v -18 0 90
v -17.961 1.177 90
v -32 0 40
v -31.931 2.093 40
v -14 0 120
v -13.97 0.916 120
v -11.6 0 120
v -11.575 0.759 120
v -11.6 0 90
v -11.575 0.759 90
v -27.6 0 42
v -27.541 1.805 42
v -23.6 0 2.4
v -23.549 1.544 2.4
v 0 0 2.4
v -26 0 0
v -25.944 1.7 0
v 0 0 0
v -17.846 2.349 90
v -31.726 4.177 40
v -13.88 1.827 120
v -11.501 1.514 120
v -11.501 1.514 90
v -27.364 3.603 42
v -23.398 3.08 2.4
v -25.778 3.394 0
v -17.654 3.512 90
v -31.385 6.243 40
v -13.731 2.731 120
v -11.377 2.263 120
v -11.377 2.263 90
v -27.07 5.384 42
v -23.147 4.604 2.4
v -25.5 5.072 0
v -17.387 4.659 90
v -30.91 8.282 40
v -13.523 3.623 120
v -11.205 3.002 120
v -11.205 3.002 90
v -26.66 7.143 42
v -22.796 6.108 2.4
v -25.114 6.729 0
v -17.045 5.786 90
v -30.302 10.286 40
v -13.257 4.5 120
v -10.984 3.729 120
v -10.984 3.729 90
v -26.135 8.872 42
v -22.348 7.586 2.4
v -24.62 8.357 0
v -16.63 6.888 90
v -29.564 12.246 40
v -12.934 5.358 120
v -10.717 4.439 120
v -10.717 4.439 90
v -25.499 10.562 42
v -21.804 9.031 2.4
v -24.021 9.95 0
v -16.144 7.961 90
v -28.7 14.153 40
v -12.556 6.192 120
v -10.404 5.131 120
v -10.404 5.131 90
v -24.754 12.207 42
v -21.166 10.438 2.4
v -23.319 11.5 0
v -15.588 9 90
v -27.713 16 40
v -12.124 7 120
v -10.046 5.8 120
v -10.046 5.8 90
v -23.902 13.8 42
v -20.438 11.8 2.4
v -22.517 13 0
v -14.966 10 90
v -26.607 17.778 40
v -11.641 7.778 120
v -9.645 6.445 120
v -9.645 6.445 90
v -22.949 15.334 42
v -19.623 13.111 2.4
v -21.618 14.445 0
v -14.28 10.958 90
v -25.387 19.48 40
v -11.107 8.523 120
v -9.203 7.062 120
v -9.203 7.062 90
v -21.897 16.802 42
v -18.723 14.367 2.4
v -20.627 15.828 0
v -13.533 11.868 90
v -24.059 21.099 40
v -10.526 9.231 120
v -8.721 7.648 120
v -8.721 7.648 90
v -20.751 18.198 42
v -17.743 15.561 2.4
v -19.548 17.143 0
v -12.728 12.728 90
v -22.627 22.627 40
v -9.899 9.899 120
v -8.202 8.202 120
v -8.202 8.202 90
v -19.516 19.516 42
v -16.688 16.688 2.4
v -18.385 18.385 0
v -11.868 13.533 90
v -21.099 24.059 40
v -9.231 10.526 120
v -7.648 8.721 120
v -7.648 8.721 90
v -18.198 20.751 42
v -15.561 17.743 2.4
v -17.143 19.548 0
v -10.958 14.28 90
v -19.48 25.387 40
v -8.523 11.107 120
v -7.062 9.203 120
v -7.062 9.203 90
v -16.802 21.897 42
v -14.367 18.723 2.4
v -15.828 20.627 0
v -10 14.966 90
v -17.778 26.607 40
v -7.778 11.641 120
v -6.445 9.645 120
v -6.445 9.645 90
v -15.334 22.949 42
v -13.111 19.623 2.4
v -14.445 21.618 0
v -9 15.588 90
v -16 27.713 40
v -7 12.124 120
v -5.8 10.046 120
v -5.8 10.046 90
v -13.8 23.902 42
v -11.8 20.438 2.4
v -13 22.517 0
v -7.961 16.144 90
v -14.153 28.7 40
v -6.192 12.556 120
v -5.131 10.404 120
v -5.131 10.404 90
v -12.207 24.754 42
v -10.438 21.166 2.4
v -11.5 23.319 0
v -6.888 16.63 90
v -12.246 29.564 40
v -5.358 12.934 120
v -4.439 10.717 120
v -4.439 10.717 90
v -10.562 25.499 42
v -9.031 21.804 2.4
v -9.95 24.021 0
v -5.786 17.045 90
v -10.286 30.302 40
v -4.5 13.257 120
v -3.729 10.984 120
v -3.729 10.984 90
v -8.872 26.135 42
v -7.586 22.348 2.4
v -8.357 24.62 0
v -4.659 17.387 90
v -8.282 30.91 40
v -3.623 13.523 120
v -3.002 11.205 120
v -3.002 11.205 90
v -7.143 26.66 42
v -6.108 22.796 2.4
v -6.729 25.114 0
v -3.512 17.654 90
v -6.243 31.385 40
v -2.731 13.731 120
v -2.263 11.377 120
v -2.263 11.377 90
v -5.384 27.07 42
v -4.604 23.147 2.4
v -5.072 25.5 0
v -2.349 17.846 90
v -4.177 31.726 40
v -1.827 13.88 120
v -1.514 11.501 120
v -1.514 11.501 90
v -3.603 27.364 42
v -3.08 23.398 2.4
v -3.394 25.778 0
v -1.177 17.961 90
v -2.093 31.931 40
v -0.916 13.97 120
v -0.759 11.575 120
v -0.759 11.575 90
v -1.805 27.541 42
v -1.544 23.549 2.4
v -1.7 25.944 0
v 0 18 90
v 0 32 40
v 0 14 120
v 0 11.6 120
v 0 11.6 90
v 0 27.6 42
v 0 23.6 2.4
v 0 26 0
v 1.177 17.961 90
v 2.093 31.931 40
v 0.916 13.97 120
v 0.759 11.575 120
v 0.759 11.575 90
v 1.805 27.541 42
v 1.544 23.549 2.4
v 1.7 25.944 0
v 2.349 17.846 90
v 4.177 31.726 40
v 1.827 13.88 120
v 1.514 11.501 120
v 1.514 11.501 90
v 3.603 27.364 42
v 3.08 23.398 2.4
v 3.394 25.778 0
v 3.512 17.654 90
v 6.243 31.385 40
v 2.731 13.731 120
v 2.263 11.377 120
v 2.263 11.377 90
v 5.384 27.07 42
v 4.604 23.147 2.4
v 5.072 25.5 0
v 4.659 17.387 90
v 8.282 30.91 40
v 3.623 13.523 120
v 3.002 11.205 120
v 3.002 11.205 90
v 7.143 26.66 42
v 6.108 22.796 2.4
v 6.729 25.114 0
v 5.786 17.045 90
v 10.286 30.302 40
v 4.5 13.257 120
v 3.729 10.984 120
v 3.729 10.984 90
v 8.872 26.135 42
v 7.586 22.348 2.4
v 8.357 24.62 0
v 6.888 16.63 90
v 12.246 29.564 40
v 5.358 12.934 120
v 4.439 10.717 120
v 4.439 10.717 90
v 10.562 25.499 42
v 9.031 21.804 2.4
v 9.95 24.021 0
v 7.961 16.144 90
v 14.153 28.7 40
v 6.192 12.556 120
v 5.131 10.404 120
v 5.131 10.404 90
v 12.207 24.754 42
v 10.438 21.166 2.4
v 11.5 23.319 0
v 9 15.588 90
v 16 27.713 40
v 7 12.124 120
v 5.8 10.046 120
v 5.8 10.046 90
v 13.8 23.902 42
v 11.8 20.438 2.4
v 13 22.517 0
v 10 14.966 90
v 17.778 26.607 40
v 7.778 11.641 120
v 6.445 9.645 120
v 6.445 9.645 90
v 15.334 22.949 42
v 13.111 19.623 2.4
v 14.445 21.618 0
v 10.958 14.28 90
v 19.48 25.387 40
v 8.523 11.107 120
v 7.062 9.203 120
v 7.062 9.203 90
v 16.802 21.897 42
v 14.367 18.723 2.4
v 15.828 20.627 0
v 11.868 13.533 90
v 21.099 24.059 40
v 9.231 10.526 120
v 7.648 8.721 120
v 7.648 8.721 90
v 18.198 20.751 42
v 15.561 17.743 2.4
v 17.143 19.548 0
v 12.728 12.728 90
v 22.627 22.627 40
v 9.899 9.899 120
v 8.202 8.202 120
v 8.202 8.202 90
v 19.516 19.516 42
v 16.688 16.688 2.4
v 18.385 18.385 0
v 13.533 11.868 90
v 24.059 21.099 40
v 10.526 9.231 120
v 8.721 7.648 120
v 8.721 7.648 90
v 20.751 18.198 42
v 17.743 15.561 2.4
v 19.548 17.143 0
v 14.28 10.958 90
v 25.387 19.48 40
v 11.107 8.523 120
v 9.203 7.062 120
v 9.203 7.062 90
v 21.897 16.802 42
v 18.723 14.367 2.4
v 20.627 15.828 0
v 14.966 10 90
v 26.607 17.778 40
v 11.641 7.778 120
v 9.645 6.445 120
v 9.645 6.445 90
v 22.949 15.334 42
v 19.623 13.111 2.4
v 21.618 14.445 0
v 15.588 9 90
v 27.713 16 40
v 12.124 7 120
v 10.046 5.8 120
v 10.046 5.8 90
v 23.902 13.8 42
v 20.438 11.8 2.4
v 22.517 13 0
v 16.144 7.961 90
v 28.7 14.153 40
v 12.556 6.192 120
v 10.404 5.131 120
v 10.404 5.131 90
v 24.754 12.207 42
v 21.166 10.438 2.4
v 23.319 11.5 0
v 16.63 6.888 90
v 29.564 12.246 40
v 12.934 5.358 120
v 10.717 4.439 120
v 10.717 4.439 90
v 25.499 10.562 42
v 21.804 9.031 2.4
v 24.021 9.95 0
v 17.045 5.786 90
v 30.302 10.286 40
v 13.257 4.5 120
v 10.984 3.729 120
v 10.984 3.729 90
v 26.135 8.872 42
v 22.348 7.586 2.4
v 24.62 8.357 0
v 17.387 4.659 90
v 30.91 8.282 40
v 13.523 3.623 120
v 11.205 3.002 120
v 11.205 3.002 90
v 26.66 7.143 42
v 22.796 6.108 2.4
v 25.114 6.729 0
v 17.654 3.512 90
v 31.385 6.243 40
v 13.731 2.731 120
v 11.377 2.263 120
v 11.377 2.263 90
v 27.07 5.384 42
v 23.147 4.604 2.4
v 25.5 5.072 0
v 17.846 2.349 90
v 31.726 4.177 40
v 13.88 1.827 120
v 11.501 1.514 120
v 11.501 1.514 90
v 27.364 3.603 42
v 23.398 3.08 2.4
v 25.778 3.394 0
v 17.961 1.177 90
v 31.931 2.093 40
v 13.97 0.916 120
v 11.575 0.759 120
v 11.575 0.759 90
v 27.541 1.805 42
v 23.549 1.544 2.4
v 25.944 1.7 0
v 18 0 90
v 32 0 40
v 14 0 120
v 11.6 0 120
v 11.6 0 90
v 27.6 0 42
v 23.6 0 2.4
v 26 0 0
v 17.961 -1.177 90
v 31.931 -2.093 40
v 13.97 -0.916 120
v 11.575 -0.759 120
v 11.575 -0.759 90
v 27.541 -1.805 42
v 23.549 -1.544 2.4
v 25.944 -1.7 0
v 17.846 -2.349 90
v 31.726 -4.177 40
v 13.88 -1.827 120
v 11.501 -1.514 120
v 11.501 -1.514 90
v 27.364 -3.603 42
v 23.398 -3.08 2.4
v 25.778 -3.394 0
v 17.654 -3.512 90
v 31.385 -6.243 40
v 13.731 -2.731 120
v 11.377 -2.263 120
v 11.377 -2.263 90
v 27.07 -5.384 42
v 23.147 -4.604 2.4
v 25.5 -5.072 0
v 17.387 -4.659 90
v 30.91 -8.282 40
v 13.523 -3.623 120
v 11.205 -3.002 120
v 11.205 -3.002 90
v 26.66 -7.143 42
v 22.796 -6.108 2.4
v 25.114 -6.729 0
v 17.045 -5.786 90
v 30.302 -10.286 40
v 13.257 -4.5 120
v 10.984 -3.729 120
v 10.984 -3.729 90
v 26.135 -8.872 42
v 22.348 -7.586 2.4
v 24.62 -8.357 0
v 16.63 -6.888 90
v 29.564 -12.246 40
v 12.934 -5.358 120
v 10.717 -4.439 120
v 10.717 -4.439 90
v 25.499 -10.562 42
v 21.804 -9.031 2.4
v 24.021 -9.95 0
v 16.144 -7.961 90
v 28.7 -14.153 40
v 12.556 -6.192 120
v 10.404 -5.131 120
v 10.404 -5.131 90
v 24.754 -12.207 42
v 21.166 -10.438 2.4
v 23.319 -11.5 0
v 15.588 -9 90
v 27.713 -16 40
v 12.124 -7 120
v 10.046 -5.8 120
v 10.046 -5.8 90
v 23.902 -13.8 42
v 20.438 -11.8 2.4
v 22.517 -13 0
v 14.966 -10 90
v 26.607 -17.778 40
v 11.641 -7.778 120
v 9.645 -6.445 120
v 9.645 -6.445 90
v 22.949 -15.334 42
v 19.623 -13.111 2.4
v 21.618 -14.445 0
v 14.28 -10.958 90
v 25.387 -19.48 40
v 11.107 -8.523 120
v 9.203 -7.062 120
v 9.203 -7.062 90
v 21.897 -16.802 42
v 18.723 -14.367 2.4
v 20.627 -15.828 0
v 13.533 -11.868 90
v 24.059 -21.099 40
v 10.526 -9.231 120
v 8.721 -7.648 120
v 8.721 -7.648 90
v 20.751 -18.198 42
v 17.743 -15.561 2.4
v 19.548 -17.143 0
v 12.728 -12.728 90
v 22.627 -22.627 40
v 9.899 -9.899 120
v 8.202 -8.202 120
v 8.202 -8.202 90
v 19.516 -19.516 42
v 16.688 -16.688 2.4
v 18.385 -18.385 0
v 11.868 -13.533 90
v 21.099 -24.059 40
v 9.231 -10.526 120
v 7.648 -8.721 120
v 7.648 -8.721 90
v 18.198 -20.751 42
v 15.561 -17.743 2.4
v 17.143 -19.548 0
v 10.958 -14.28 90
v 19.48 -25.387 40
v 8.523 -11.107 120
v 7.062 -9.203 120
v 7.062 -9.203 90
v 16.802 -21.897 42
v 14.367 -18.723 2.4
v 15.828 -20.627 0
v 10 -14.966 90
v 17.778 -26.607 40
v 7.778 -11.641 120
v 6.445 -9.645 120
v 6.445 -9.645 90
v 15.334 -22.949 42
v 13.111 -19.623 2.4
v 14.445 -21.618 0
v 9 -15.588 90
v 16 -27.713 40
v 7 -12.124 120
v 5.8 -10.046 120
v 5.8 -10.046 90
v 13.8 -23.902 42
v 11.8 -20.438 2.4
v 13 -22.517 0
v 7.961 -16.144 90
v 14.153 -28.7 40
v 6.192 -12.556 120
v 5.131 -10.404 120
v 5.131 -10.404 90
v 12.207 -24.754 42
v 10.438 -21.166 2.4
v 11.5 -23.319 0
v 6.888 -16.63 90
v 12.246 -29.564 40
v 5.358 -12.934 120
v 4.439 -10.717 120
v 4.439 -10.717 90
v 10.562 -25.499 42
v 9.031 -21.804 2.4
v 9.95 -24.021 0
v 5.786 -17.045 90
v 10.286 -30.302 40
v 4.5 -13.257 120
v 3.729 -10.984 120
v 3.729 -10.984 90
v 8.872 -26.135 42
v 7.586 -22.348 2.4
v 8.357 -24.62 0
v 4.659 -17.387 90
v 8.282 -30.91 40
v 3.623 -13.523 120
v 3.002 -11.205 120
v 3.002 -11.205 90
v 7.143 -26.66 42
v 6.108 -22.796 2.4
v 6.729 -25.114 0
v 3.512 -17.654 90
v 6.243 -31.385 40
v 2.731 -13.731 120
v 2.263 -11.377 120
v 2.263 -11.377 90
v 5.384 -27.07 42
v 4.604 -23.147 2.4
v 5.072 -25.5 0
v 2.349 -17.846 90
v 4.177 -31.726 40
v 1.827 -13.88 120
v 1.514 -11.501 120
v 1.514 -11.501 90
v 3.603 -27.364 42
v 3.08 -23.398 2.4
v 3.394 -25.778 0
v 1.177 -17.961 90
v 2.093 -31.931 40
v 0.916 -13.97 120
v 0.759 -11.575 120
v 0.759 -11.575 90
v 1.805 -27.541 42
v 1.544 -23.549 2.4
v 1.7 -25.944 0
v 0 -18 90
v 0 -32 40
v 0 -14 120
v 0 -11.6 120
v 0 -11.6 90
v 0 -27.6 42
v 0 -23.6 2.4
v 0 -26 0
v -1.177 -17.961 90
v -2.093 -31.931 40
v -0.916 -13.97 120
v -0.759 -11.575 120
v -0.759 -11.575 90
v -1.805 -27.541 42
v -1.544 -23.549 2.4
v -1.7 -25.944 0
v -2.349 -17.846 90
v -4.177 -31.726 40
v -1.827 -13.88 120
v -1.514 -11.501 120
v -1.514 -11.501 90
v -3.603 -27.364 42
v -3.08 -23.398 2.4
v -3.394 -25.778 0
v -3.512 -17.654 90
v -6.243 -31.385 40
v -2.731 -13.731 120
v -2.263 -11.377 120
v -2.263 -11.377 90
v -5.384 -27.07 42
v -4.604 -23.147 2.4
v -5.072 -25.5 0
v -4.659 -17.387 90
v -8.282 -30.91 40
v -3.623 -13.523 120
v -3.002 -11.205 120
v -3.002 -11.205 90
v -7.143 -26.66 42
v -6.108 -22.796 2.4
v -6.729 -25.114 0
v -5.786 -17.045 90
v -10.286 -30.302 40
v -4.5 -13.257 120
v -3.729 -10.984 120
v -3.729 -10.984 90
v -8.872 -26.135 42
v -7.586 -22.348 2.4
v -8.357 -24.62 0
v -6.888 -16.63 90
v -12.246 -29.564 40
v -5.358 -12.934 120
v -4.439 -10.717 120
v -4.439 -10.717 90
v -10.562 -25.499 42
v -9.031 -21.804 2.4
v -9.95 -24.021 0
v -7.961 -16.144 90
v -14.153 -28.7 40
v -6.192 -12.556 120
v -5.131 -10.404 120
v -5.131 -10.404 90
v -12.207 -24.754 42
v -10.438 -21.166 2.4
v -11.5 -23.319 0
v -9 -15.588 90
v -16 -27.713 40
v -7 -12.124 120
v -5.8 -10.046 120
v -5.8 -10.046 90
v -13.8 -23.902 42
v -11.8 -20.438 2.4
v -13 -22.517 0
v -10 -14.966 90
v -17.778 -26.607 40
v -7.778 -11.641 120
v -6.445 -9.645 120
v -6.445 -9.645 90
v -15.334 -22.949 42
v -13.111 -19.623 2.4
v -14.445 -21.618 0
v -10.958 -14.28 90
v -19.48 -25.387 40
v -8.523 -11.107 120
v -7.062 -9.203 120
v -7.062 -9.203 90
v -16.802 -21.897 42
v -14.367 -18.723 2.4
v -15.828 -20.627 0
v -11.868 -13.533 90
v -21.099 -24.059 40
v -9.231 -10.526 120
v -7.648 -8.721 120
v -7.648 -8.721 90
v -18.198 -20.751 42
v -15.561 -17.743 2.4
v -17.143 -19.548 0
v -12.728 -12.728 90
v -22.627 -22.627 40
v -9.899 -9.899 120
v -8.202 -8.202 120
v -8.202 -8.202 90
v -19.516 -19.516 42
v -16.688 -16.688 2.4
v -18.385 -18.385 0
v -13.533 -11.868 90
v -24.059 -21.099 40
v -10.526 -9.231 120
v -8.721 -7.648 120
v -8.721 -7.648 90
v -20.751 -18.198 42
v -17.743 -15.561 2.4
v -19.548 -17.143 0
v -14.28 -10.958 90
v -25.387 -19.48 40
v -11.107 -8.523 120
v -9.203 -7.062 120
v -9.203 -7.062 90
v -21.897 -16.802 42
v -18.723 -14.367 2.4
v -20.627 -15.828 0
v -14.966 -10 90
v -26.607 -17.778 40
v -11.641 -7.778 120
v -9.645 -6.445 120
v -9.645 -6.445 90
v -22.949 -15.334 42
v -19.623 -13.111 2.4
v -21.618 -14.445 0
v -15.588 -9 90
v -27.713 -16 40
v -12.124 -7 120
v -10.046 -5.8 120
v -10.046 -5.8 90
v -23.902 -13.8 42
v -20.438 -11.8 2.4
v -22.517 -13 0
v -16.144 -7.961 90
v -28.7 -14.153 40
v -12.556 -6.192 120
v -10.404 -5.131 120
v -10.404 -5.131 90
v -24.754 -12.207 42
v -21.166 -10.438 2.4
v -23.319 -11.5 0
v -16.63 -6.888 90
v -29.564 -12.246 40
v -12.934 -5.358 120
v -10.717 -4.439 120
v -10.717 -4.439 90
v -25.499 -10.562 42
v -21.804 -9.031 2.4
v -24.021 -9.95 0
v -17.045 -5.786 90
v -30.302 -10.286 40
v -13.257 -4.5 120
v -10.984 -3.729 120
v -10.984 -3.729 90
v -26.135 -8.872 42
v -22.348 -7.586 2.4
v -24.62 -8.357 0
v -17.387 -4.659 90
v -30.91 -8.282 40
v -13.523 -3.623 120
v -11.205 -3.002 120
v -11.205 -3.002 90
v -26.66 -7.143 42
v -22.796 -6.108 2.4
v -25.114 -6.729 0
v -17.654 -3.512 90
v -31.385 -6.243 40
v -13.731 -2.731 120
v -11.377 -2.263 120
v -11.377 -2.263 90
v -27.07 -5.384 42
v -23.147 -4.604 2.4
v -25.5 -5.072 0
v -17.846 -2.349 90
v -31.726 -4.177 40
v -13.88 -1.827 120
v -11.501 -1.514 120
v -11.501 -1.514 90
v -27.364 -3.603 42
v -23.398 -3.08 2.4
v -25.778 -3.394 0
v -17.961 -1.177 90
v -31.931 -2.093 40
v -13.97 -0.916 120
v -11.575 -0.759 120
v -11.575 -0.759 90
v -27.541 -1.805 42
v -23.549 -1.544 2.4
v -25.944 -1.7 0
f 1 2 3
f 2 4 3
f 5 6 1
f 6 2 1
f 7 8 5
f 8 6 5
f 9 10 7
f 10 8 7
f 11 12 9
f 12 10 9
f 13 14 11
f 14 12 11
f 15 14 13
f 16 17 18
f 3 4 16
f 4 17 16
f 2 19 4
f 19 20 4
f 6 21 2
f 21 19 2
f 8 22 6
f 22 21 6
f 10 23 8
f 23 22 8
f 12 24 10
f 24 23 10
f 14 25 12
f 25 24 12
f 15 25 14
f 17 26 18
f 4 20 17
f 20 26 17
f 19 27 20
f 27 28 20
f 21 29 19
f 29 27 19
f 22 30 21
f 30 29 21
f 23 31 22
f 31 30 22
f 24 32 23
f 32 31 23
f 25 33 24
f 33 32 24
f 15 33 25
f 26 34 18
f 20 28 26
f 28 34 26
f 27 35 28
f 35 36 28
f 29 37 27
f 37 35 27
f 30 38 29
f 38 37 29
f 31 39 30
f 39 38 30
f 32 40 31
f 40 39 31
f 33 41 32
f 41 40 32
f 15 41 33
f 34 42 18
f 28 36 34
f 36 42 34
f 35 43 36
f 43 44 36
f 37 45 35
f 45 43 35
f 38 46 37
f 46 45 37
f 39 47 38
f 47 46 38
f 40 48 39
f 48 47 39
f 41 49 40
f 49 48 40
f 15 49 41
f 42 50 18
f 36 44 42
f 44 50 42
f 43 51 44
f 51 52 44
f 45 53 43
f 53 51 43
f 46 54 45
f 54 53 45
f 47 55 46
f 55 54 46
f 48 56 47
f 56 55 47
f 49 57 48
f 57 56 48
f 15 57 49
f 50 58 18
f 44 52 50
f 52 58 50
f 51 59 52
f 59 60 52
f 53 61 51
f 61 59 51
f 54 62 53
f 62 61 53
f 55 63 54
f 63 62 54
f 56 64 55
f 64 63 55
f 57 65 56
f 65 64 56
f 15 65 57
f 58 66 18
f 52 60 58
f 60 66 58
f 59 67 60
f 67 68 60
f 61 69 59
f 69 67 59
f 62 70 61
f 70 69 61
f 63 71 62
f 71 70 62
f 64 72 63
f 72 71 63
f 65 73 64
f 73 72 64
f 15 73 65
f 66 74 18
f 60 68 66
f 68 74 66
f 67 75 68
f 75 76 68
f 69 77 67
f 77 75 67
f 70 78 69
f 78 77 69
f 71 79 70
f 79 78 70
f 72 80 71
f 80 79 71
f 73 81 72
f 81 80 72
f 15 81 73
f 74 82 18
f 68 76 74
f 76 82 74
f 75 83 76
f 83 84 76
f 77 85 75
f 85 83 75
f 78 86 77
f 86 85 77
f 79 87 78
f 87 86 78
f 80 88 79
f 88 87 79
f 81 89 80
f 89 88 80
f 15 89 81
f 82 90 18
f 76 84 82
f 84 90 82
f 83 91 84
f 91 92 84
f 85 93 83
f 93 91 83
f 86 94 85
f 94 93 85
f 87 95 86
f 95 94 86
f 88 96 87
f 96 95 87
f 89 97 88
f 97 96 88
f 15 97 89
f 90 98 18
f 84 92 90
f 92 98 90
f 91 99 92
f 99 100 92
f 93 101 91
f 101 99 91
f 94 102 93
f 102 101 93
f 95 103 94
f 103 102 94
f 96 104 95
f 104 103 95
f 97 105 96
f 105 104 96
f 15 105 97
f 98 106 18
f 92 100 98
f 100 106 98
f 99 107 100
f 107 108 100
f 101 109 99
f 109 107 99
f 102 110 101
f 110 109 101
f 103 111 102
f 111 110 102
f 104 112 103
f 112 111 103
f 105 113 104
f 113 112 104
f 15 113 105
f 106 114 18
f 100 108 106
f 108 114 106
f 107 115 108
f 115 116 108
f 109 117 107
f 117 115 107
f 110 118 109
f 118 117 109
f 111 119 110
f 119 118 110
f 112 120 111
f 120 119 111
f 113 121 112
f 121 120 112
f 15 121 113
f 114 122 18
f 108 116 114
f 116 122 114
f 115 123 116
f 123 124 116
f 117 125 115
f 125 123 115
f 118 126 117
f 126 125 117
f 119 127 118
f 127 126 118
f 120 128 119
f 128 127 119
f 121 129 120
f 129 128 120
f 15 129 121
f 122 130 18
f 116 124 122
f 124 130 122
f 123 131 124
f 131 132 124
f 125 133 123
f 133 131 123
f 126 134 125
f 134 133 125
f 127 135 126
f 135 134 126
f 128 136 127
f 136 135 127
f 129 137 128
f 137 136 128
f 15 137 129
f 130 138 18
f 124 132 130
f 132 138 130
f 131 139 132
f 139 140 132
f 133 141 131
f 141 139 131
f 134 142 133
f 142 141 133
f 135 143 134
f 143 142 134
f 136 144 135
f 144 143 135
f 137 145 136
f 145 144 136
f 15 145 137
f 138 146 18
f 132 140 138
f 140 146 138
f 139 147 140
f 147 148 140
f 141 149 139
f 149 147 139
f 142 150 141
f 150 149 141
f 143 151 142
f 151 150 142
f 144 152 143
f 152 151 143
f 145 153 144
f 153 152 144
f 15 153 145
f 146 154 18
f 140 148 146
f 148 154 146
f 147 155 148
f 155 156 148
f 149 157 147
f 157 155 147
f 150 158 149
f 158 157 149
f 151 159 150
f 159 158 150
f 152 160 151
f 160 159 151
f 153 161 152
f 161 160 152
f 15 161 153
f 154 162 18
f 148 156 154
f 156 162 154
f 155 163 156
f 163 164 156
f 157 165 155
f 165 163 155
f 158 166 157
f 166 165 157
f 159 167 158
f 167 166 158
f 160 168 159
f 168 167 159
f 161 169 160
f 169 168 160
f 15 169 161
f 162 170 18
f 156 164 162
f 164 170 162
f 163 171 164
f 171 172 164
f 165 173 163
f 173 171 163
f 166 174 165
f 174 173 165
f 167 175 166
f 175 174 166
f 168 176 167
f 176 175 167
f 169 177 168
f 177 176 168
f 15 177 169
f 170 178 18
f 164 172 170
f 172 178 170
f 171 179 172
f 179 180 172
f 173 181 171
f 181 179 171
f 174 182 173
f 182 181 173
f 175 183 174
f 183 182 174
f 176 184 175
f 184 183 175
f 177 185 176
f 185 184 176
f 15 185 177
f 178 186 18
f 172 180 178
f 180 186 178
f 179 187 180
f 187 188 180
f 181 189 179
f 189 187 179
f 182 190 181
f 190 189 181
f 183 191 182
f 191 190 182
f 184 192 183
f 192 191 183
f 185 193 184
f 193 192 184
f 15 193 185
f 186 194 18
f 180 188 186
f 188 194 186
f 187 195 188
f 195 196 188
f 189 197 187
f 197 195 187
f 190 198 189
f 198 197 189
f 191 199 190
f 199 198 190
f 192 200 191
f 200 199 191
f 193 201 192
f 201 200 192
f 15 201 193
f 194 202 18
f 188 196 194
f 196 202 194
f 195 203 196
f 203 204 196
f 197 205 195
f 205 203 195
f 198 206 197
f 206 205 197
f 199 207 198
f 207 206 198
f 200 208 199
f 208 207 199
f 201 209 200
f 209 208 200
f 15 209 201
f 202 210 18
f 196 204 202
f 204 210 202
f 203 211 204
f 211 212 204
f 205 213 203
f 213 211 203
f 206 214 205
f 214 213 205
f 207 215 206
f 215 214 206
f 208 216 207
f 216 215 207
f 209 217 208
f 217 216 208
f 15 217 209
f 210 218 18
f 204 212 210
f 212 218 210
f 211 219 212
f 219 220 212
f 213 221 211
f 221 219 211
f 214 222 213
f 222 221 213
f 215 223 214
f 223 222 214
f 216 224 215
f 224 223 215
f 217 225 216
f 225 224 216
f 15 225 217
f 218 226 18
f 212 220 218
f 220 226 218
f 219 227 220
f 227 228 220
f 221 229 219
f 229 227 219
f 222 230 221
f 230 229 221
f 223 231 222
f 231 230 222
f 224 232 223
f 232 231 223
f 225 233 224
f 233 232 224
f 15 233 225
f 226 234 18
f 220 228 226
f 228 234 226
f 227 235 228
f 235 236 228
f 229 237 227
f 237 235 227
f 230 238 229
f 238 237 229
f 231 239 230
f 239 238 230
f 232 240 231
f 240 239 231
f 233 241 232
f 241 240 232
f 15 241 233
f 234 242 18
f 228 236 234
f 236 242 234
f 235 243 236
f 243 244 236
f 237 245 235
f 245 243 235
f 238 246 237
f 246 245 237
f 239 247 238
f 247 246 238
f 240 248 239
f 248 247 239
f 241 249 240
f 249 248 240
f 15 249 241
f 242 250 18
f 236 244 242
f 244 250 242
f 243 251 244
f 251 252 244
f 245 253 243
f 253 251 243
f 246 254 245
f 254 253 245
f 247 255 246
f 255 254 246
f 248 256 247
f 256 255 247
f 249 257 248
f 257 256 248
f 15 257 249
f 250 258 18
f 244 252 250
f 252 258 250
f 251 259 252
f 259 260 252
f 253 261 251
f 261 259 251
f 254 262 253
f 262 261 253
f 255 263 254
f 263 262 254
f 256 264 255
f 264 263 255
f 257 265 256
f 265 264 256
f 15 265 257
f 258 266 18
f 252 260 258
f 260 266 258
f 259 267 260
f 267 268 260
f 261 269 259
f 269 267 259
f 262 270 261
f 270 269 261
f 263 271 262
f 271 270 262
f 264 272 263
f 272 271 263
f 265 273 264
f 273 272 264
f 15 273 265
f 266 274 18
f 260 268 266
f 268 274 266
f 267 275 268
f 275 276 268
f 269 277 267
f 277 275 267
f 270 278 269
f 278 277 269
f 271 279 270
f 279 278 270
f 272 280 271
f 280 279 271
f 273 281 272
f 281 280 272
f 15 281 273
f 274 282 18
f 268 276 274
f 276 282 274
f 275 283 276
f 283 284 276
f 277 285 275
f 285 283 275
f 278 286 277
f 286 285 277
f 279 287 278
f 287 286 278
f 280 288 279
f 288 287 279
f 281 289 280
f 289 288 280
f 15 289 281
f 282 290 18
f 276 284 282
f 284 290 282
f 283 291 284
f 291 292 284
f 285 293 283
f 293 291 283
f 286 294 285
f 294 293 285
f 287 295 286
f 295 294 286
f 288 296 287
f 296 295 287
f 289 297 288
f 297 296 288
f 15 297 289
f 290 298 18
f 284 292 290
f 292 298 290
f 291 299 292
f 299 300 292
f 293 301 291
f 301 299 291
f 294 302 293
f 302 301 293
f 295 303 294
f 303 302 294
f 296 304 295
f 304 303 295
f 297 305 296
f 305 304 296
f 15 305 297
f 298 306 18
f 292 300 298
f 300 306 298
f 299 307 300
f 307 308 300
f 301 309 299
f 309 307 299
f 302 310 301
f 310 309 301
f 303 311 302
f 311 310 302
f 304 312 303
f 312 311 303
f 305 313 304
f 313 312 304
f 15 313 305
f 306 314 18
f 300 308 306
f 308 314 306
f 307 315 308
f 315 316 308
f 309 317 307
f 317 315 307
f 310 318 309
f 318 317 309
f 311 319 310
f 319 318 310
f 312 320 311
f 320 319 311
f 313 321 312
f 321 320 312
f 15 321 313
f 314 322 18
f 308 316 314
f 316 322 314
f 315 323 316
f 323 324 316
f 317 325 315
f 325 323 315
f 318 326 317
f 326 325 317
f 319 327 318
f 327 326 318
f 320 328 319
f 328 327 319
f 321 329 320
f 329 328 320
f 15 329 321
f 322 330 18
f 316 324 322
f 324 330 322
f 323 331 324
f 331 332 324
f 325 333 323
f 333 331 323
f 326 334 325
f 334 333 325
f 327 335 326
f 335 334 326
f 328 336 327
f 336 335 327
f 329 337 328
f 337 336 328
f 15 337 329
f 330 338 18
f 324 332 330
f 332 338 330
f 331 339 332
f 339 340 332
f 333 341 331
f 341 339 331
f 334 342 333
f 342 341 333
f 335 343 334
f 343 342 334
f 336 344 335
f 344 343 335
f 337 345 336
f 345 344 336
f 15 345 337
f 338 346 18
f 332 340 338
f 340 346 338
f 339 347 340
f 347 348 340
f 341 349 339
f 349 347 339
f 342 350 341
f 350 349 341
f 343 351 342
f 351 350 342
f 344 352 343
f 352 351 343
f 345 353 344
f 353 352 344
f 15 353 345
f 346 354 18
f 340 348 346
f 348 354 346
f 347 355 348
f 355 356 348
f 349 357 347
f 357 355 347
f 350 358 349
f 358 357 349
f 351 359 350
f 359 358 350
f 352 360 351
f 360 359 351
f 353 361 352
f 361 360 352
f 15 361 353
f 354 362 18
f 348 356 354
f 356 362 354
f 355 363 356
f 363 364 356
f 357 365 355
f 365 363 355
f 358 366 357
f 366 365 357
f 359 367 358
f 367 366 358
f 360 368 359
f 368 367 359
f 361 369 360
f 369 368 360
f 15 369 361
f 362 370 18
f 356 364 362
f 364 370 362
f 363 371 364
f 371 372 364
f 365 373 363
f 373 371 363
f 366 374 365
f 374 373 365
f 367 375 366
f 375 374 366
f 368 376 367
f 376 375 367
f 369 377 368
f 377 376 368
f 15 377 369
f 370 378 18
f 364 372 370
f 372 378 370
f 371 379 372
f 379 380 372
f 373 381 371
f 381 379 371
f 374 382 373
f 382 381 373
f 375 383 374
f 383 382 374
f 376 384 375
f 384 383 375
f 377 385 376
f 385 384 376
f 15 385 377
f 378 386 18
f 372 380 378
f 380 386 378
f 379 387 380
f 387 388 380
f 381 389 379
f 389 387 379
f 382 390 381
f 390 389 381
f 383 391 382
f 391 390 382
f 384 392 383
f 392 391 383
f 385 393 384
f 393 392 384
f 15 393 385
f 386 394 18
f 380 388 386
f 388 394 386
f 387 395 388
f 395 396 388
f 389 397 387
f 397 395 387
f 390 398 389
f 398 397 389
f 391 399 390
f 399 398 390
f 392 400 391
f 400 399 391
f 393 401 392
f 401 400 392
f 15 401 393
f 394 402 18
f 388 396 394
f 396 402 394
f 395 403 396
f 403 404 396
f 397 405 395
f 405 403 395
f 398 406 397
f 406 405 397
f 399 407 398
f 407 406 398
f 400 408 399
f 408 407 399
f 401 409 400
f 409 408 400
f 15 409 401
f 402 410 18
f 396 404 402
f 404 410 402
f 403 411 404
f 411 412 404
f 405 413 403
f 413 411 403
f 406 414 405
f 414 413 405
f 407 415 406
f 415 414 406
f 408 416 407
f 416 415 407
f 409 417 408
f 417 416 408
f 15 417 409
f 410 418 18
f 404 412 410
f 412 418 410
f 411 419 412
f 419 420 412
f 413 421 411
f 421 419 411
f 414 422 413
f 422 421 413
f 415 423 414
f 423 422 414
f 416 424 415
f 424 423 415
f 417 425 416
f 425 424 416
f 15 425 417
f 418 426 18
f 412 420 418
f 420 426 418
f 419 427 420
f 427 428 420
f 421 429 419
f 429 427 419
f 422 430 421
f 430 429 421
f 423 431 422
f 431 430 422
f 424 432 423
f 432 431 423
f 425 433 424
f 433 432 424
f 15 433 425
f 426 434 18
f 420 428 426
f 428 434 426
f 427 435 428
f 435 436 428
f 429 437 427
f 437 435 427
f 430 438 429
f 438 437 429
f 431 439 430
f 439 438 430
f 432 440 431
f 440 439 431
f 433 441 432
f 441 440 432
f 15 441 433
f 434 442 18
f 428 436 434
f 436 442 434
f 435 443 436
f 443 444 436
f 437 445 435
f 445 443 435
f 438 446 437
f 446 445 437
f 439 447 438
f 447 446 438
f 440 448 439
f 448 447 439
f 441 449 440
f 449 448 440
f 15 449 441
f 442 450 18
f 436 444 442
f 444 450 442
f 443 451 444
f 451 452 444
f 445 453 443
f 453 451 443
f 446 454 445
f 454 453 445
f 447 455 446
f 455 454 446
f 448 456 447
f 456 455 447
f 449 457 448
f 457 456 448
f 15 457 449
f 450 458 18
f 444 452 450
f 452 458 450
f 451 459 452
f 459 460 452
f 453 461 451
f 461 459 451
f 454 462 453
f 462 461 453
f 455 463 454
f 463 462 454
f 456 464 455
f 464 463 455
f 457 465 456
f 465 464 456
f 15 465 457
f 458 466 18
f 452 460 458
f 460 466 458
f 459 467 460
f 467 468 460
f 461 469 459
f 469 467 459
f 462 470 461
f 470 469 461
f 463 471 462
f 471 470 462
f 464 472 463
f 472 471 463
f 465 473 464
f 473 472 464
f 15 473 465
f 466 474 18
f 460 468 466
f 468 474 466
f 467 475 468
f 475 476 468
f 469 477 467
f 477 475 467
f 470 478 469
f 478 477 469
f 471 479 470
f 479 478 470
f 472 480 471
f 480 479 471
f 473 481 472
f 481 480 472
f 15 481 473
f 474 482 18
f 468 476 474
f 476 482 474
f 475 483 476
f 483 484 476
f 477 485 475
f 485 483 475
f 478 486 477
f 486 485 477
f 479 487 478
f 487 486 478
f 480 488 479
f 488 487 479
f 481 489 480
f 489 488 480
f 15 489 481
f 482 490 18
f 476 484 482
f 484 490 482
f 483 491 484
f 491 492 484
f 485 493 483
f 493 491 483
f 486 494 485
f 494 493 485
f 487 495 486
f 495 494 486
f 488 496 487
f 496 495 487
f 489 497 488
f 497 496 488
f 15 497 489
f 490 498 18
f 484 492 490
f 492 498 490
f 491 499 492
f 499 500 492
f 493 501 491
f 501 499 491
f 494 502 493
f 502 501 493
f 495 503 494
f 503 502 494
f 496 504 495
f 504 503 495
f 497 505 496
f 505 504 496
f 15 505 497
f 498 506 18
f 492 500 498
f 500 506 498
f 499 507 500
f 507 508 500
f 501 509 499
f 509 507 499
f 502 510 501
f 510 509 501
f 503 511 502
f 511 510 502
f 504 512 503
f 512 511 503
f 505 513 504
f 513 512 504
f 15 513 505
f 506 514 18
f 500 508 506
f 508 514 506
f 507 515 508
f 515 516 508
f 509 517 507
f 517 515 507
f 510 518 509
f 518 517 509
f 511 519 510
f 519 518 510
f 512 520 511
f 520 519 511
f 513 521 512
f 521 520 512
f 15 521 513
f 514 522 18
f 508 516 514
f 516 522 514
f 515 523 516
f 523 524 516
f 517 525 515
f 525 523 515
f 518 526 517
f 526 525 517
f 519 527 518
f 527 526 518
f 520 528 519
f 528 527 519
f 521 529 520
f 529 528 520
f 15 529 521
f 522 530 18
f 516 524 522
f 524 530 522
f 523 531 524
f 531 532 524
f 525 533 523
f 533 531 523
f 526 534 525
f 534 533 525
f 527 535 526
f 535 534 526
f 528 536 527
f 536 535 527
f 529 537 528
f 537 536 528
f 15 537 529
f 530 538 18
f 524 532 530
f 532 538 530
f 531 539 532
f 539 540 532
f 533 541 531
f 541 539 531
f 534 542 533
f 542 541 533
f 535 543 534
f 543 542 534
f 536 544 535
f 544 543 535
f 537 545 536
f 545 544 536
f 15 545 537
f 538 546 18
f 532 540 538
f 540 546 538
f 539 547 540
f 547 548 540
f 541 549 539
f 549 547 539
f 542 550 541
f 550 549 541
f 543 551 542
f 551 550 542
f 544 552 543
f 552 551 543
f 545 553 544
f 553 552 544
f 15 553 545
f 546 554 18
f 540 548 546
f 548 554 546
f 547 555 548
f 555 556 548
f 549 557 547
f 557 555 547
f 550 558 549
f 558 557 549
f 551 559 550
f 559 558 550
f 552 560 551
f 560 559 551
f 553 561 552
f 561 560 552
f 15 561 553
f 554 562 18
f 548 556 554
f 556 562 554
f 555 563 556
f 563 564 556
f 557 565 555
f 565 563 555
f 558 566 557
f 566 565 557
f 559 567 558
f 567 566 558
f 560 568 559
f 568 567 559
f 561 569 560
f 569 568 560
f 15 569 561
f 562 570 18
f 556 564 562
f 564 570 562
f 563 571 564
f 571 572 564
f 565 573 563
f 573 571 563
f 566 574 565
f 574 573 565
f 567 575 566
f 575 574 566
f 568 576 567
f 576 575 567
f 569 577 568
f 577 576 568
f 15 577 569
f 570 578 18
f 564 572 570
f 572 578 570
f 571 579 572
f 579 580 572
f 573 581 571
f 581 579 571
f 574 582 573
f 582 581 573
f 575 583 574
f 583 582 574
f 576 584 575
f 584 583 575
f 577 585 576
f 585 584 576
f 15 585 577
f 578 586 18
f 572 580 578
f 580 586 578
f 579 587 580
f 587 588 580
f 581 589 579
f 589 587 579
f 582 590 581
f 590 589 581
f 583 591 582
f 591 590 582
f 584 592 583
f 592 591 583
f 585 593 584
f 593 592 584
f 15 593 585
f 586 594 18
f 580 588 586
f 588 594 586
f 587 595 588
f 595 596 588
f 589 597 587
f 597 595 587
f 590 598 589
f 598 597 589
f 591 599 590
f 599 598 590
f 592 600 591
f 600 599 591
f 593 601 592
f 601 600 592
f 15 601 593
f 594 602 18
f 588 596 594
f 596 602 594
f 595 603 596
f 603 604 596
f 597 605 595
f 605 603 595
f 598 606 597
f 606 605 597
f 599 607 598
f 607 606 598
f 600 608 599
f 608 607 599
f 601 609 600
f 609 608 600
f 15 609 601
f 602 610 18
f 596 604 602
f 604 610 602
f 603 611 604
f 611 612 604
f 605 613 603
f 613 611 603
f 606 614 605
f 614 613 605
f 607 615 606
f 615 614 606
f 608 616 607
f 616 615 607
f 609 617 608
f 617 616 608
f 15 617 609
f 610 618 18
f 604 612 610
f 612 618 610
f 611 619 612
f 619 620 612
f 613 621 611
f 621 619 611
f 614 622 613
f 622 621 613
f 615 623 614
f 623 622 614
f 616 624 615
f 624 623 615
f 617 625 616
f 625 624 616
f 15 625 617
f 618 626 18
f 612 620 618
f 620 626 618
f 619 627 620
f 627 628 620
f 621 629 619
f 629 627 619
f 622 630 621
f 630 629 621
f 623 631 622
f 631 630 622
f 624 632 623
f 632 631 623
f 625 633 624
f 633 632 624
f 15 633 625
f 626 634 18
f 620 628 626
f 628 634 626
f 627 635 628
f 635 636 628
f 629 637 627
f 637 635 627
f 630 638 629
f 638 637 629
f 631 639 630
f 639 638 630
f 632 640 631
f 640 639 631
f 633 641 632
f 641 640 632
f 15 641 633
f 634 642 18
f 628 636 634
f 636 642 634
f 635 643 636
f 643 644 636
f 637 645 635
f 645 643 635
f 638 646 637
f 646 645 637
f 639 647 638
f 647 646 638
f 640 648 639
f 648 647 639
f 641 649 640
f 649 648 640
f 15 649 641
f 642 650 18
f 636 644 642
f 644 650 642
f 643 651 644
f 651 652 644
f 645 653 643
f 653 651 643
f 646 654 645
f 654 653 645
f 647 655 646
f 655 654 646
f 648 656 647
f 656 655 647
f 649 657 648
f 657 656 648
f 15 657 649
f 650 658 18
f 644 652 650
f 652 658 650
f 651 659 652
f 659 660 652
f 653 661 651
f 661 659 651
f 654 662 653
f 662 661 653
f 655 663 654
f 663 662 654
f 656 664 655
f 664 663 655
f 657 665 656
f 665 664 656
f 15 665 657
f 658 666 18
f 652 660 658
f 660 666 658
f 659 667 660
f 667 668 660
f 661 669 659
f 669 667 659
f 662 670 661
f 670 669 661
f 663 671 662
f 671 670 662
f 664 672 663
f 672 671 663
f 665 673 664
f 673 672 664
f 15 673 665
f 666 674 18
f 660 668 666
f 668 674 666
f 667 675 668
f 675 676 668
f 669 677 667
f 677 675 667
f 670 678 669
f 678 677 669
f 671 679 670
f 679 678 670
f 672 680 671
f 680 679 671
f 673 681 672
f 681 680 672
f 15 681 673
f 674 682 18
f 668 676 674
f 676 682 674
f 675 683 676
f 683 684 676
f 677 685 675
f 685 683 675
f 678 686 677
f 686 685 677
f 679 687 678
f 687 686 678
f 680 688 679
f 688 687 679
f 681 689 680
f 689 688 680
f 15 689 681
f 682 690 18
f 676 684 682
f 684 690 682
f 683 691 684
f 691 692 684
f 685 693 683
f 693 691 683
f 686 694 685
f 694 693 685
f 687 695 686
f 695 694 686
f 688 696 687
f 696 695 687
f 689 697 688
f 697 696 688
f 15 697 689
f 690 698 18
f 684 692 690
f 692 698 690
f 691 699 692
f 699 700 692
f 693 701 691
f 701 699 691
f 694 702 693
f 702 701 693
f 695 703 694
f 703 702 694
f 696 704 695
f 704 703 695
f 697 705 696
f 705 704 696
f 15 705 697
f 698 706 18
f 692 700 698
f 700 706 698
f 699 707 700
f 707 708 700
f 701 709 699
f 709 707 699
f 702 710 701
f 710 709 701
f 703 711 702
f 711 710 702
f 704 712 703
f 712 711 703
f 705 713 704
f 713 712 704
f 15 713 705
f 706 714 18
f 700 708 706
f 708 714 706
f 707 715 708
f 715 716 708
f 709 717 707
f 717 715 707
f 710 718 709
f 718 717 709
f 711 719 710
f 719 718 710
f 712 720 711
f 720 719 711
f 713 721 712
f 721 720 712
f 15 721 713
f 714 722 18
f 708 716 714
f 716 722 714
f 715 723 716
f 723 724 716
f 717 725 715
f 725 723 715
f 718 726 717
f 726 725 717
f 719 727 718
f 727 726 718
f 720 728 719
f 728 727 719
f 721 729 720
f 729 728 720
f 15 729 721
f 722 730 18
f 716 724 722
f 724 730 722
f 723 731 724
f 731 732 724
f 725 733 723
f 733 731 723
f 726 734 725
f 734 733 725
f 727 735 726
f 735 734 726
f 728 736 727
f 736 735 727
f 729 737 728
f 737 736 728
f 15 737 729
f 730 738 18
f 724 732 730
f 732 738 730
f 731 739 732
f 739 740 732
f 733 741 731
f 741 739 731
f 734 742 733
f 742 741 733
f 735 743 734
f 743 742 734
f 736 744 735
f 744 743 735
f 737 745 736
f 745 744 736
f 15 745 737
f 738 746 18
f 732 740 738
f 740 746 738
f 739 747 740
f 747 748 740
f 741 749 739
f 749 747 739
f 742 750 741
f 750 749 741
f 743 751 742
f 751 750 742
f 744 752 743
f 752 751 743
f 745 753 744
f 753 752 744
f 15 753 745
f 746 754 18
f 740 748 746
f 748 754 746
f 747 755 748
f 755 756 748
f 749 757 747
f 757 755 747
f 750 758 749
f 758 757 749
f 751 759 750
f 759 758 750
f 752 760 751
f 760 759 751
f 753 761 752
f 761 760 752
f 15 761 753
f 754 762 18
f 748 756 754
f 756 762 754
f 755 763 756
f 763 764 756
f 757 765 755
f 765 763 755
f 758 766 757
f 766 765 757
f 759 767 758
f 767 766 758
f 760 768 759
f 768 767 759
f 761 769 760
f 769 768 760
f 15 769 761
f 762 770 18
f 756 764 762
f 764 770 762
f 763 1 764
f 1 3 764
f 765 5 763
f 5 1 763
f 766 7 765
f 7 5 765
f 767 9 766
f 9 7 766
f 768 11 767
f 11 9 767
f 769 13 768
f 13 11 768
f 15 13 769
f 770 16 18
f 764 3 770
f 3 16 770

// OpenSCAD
// Ваза: двумерный профиль, развёрнутый в тело.
//
// Это второе, что умеет OpenSCAD (первое — CSG): взять контур и «выдавить»
// его вращением. Профиль задан списком точек, отверстие получается само,
// потому что контур замкнут и не касается оси.
//
// В DSL ФОРМЫ аналог — команда `revolve points=[...]`; смысл тот же, меняется
// только запись.

h = 120;          // высота, мм
r_base = 26;      // радиус основания
r_neck = 14;      // радиус горла
wall = 2.4;       // толщина стенки
$fn = 96;         // сегментов по кругу

profile = [
    [0, 0],
    [r_base, 0],
    [r_base + 6, 40],
    [r_neck + 4, 90],
    [r_neck, h],
    [r_neck - wall, h],
    [r_neck - wall, 90],
    [r_base - wall + 4, 42],
    [r_base - wall, wall],
    [0, wall],
];

rotate_extrude(angle = 360) polygon(points = profile);
